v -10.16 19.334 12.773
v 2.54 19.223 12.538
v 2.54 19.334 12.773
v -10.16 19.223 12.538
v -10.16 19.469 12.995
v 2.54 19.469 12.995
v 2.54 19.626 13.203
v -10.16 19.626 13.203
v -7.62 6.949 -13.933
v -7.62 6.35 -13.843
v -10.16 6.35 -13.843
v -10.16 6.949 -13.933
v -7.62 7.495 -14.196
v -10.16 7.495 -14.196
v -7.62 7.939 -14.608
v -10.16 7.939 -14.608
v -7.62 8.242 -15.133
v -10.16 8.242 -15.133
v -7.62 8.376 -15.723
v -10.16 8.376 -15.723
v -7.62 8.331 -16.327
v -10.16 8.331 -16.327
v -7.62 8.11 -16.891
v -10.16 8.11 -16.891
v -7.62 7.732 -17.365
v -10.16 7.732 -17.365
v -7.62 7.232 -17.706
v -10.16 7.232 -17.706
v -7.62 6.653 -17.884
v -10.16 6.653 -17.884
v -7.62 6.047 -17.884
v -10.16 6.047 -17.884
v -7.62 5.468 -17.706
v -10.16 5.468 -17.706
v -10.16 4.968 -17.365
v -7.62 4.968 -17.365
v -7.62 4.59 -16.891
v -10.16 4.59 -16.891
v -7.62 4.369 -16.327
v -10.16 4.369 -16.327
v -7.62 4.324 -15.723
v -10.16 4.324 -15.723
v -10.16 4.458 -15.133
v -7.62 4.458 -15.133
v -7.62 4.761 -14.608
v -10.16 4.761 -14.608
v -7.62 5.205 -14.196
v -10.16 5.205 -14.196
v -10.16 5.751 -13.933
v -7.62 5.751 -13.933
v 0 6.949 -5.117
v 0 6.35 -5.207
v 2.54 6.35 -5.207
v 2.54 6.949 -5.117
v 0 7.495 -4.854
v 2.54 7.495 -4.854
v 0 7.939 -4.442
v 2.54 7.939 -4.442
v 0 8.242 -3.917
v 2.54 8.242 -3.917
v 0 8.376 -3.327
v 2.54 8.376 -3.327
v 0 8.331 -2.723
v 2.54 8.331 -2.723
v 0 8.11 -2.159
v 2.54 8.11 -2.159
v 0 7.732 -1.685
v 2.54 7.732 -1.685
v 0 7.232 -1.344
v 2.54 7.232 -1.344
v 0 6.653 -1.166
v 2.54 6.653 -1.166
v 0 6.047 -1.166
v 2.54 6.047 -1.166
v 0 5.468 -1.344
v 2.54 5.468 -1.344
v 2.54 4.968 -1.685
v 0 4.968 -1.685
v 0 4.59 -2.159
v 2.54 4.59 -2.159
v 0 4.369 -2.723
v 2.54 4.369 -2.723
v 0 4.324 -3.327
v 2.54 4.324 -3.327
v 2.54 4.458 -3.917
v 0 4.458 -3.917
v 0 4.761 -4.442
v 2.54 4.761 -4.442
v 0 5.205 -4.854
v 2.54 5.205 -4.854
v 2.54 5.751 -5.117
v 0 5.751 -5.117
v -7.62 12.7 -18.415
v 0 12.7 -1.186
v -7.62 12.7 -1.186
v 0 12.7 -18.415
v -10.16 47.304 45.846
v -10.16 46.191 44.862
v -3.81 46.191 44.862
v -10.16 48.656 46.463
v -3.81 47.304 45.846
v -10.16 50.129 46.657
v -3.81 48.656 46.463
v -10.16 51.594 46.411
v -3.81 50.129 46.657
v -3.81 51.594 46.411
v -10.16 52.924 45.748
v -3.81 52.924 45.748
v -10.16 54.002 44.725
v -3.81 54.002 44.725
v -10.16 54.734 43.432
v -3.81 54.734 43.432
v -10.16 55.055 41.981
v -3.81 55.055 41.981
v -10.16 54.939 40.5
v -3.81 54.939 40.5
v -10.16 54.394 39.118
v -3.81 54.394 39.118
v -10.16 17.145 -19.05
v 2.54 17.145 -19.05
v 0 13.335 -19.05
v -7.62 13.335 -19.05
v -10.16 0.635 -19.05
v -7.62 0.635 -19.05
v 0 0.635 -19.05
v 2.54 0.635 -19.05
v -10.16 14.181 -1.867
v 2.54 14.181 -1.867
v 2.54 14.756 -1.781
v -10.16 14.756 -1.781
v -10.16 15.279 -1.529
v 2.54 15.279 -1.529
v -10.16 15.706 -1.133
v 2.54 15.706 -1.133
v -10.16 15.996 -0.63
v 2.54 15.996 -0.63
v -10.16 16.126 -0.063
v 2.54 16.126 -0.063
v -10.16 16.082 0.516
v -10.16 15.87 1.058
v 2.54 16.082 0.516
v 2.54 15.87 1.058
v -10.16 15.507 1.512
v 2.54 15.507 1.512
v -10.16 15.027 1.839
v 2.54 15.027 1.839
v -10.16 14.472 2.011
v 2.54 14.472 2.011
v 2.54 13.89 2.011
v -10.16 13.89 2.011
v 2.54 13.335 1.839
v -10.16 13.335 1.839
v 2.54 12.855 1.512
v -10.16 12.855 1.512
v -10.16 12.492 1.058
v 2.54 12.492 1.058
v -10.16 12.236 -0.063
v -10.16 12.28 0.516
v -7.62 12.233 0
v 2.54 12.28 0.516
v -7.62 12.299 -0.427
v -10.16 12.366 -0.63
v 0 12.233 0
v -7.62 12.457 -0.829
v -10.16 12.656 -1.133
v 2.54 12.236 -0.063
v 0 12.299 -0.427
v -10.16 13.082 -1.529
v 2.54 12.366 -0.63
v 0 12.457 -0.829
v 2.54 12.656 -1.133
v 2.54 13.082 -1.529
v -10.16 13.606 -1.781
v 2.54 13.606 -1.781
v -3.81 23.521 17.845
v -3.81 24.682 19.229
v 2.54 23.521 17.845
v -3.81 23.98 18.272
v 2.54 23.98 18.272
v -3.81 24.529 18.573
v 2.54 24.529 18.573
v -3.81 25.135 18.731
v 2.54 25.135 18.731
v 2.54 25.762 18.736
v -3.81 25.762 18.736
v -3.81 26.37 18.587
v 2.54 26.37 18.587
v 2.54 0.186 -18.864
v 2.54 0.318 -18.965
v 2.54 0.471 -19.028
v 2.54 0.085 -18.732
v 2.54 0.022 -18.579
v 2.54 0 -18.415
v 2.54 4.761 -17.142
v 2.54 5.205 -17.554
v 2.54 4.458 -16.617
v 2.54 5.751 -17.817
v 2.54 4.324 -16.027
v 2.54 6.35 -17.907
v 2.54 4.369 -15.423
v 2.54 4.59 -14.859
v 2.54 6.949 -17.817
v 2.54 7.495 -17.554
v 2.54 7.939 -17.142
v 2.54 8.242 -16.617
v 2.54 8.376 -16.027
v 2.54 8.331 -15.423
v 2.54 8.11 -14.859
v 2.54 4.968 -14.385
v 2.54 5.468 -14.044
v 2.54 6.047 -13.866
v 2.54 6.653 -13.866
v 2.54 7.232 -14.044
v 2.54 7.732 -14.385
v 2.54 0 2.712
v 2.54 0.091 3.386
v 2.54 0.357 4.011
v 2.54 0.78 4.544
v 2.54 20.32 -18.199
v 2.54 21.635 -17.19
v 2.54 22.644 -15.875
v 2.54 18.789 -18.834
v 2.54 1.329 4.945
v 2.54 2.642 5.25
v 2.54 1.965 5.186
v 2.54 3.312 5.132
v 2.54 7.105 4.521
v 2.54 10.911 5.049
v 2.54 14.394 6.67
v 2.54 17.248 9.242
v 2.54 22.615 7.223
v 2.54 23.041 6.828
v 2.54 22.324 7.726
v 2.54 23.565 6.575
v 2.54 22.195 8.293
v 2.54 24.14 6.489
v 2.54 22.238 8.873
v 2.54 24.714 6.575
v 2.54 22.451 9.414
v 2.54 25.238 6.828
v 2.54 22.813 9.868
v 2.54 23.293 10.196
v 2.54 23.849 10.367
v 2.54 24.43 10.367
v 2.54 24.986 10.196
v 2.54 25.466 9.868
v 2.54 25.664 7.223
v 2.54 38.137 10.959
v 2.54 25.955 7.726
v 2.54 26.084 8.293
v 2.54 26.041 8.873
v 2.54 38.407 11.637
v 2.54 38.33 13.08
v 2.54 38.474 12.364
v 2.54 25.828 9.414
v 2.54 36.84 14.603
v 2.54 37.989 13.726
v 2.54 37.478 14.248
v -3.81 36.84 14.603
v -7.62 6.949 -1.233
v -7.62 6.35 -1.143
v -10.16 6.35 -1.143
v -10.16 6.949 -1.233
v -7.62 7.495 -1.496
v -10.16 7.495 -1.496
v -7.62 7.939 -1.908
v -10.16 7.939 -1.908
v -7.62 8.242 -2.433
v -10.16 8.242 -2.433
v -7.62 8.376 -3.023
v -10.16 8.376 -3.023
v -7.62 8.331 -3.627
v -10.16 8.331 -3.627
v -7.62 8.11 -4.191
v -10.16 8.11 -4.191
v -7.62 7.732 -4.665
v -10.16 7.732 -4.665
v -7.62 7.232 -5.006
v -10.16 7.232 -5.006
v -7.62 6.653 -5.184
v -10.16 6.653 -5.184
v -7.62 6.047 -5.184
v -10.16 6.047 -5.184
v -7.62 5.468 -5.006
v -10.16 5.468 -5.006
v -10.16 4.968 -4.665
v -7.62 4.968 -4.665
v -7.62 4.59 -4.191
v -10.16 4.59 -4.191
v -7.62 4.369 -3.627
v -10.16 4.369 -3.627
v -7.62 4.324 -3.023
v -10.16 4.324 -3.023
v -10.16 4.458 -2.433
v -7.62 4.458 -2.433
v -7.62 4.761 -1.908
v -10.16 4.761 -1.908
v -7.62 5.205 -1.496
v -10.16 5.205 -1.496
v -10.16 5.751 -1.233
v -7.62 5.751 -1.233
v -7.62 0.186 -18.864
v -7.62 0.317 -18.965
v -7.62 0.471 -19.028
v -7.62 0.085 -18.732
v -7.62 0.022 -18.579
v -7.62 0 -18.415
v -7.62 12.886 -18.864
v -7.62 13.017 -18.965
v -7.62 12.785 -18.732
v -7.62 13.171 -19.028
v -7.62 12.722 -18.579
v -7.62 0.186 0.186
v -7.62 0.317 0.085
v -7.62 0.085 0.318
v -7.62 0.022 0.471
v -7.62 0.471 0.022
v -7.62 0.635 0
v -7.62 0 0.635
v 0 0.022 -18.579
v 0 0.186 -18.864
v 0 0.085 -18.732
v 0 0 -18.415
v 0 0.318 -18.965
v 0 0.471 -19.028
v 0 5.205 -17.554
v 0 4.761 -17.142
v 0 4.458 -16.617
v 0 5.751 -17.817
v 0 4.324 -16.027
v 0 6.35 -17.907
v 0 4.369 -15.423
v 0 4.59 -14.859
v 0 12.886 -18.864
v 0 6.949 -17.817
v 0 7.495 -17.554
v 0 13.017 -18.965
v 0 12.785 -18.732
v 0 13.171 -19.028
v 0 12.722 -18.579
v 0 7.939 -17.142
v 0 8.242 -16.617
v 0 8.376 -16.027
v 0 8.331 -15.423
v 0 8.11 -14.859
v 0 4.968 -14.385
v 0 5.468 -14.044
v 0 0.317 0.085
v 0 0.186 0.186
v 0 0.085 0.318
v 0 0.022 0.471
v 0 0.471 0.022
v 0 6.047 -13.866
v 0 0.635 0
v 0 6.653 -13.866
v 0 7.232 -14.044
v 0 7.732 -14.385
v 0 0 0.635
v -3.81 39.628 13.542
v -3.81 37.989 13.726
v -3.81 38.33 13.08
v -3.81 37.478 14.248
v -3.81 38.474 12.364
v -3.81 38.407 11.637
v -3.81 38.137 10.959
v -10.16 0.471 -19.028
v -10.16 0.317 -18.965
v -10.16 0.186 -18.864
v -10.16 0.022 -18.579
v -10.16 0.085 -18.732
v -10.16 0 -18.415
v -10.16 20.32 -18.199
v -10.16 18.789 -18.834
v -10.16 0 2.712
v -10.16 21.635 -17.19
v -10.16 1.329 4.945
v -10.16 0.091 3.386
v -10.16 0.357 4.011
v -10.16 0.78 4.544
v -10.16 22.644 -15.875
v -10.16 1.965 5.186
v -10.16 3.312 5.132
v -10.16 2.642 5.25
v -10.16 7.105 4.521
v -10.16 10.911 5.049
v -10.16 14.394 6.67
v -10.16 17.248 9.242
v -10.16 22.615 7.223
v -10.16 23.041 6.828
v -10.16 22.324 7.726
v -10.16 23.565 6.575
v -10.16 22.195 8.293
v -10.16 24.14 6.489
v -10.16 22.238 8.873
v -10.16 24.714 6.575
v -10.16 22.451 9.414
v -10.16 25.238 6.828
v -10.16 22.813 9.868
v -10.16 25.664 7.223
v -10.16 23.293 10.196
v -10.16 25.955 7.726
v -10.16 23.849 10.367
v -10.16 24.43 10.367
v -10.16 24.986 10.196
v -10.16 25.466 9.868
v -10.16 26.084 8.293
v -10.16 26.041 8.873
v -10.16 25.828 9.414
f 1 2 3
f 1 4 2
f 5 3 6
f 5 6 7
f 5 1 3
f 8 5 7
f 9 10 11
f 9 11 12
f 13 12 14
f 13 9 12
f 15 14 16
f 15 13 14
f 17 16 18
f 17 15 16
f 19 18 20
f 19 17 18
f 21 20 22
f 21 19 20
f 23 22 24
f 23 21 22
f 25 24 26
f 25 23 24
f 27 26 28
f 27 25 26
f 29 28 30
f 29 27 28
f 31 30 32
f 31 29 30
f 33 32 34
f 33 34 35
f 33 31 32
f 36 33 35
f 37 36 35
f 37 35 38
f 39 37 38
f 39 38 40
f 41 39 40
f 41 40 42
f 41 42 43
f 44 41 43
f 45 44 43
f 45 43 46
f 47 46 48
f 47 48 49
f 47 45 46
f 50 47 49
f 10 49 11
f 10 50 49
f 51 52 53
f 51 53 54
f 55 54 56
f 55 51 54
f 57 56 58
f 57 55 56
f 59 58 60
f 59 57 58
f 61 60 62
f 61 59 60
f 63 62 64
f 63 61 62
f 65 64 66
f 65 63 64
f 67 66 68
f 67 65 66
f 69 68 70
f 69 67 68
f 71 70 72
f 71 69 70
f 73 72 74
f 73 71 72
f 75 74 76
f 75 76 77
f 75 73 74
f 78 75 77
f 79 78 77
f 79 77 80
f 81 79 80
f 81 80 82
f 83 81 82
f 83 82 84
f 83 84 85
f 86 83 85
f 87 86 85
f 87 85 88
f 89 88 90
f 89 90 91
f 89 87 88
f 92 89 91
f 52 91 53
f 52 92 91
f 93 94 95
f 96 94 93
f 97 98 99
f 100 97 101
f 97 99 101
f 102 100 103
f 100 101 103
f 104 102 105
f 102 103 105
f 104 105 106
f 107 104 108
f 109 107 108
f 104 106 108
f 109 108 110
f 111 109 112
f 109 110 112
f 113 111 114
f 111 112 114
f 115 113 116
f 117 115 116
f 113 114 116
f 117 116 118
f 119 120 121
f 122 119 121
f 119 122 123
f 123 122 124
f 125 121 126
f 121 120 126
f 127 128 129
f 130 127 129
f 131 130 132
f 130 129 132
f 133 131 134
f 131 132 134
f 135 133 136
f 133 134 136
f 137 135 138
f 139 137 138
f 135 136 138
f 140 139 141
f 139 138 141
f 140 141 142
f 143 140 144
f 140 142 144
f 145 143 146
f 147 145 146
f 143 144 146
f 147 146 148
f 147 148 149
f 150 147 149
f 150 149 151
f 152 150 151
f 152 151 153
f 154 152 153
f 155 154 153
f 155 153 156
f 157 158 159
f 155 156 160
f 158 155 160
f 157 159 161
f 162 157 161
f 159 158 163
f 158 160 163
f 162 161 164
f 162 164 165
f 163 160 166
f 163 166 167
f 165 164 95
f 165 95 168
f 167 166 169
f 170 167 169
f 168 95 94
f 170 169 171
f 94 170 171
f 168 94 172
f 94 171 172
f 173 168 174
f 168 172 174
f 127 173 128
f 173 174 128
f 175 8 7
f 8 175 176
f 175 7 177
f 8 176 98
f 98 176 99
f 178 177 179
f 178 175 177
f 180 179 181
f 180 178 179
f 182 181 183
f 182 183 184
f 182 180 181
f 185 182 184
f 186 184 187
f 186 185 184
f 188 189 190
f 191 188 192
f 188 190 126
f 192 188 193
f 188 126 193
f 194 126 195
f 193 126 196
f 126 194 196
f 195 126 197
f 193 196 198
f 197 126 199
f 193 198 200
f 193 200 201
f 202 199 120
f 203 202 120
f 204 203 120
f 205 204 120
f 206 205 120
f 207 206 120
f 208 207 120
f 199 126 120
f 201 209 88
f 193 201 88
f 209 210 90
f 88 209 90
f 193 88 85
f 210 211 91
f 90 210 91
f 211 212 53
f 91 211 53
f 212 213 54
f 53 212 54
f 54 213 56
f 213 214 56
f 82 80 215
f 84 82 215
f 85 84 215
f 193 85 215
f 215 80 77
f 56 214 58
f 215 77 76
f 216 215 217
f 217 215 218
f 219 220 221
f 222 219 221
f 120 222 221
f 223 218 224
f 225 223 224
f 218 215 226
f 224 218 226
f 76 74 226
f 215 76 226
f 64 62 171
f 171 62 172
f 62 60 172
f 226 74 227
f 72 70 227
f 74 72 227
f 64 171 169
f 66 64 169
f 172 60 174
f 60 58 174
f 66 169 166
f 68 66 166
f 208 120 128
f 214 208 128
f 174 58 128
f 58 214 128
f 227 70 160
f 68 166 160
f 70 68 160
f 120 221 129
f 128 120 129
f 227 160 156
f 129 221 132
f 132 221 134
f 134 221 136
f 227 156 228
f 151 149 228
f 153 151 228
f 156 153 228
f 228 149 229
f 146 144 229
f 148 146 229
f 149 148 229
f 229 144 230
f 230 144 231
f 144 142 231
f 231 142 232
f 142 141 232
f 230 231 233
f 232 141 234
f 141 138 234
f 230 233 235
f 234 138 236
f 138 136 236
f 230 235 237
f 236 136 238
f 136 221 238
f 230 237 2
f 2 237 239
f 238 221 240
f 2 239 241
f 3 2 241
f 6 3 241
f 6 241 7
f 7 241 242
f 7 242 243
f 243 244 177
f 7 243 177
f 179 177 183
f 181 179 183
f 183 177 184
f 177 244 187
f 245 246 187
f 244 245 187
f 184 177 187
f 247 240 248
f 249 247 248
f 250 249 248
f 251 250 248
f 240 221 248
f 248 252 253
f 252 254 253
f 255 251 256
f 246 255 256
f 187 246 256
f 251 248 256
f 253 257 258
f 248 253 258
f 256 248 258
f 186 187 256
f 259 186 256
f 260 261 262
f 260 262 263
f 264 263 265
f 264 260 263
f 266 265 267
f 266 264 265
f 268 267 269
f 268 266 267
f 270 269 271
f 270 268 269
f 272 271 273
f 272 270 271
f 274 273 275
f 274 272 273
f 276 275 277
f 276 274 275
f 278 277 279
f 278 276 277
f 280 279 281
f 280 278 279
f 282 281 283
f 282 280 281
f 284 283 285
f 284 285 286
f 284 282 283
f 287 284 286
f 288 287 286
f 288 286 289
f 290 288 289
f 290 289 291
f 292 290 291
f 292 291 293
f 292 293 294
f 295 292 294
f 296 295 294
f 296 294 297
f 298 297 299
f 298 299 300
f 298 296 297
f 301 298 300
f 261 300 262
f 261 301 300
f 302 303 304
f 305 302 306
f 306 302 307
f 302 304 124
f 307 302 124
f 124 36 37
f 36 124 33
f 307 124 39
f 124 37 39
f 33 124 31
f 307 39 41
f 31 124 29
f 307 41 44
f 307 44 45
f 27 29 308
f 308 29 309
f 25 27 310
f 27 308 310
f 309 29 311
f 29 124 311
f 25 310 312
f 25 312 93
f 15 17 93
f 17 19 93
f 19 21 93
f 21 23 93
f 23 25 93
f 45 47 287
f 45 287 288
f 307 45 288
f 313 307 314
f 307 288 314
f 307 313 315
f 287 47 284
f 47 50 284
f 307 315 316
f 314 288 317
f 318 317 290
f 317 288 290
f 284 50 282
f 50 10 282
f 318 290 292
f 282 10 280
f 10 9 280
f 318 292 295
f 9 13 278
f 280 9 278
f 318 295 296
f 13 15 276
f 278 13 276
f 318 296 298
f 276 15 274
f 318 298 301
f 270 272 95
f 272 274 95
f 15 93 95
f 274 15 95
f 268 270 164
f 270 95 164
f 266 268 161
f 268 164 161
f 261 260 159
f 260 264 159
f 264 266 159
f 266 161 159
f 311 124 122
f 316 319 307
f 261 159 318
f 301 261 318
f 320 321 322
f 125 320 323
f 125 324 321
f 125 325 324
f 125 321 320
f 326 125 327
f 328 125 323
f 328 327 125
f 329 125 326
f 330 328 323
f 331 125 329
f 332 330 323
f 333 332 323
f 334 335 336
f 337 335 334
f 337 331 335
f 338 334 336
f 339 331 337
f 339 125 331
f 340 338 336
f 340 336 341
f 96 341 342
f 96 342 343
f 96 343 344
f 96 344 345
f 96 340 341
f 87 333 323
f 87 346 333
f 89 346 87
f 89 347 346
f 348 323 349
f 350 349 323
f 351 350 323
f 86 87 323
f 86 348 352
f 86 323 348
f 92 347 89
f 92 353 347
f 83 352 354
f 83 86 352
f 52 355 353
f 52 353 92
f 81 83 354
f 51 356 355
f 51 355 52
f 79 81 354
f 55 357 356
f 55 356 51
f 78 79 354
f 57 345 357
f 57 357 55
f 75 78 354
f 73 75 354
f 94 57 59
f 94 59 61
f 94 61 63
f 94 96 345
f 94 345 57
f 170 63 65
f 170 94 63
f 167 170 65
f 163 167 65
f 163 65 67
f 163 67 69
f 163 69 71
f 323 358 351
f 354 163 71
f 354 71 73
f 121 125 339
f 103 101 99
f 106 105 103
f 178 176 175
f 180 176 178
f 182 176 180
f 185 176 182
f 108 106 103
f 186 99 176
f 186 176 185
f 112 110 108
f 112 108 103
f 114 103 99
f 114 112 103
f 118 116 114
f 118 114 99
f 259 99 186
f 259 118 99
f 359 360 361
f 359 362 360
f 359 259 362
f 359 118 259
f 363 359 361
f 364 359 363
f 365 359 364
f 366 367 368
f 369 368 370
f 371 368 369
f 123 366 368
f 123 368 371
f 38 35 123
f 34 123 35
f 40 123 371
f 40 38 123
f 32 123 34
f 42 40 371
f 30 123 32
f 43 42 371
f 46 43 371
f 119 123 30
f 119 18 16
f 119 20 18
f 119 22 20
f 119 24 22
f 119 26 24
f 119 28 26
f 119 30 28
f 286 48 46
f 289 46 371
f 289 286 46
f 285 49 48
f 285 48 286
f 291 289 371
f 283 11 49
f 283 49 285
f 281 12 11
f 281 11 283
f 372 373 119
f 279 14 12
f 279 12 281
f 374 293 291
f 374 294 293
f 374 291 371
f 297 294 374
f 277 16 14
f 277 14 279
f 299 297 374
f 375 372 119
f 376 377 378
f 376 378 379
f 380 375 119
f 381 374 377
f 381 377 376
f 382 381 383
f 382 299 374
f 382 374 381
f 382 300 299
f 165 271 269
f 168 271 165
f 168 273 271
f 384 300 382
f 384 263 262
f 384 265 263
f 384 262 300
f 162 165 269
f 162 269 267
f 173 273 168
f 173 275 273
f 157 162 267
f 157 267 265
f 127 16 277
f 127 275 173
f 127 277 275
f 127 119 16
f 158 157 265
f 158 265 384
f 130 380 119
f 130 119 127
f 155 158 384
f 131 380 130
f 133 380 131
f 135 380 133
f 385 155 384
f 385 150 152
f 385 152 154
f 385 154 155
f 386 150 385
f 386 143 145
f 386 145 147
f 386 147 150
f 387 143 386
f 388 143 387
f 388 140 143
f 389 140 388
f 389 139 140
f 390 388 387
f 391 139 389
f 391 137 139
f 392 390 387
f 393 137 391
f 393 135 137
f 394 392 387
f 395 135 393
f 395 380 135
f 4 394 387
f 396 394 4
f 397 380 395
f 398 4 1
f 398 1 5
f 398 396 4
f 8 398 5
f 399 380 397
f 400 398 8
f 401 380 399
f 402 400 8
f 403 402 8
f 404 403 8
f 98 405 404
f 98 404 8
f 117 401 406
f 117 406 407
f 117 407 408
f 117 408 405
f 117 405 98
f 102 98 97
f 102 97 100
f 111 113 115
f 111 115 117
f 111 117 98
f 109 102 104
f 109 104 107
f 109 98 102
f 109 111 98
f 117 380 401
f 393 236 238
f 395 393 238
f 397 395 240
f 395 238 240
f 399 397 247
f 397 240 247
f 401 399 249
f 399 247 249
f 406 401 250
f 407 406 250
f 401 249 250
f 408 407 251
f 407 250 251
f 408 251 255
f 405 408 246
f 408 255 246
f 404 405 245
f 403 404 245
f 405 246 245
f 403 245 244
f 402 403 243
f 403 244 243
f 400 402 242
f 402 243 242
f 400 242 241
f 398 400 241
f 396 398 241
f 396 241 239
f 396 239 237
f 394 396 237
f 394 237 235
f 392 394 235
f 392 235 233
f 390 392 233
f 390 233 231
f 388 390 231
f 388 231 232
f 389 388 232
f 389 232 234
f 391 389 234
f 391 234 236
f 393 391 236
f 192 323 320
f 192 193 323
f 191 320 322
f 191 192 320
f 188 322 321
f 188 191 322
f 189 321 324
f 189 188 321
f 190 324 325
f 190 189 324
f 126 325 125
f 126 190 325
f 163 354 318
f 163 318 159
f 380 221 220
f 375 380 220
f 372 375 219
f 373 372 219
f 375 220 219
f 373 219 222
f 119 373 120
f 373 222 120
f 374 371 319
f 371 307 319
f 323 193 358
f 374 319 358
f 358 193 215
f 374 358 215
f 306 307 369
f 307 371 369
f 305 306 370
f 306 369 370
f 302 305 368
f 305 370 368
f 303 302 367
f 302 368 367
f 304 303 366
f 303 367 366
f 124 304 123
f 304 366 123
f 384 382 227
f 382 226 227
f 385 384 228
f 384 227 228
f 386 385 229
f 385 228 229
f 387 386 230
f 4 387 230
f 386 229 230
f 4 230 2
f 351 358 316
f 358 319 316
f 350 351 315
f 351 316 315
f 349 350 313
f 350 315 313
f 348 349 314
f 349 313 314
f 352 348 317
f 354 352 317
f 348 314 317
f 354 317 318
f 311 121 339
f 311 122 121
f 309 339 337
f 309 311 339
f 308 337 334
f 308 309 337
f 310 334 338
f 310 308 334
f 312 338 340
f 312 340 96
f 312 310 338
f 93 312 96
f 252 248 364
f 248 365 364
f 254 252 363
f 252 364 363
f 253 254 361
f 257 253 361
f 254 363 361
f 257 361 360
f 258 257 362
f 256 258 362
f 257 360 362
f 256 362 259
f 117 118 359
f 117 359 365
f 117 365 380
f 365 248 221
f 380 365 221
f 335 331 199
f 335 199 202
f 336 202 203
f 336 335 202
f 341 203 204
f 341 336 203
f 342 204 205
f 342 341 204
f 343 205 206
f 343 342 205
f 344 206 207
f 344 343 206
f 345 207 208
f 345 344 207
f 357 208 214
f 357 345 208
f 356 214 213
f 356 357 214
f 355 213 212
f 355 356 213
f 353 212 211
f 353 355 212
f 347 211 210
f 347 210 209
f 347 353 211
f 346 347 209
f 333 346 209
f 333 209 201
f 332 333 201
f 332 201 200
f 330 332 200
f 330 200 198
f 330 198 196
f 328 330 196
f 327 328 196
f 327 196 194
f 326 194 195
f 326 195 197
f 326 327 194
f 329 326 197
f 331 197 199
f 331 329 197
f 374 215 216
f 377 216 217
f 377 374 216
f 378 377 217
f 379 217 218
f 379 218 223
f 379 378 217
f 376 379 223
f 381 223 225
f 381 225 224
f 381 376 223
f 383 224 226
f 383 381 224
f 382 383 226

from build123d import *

# Parameters (mm, degrees)
SKETCH1_R           = 2.032
BOSS_EXTRUDE1_DEPTH = 2.54
BOSS_EXTRUDE2_START = -7.62
BOSS_EXTRUDE2_DEPTH = 7.62
BOSS_EXTRUDE3_START = 2.54
SKETCH4_R           = 2.032
BOSS_EXTRUDE3_DEPTH = 2.54
CUT_EXTRUDE2_START  = -6.35
CUT_EXTRUDE2_DEPTH  = 6.35
FILLET1_R           = 2.54
FILLET2_R           = 0.635
SKETCH6_R           = 1.95
CUT_EXTRUDE3_DEPTH  = 74.28469602


with BuildPart() as part:
    # Sketch1 → Boss-Extrude1 (new body)
    with BuildSketch(Plane(origin=(0, 0, 0), x_dir=(0, 0, -1), z_dir=(1, 0, 0))):
        with BuildLine():
            Line((19.05, 0), (19.05, 17.145))
            ThreePointArc((19.05, 17.145), (18.199261314, 20.32), (15.875, 22.644261314))
            Line((15.875, 22.644261314), (-39.11761314, 54.394261314))
            ThreePointArc((-39.11761314, 54.394261314), (-45.74830741, 52.924271785), (-44.861814719, 46.190691279))
            Line((-44.861814719, 46.190691279), (-12.887784973, 19.361294713))
            ThreePointArc((-12.887784973, 19.361294713), (-5.127948142, 11.168903642), (-6.736031019, 0))
            Line((-6.736031019, 0), (19.05, 0))
        make_face()
        with Locations((3.175, 6.35)):
            Circle(SKETCH1_R, mode=Mode.SUBTRACT)
        with Locations((15.875, 6.35)):
            Circle(SKETCH1_R, mode=Mode.SUBTRACT)
    extrude(amount=BOSS_EXTRUDE1_DEPTH)

    # Sketch1<4> → Boss-Extrude2 (add)
    with BuildSketch(Plane(origin=(0, 0, 0), x_dir=(0, 0, -1), z_dir=(1, 0, 0)).offset(BOSS_EXTRUDE2_START)):
        with BuildLine():
            Line((-6.736031019, 0), (0, 0))
            Line((0, 0), (0, 12.7))
            Line((0, 12.7), (19.05, 12.7))
            Line((19.05, 12.7), (19.05, 17.145))
            ThreePointArc((19.05, 17.145), (18.199261314, 20.32), (15.875, 22.644261314))
            Line((15.875, 22.644261314), (-39.11761314, 54.394261314))
            ThreePointArc((-39.11761314, 54.394261314), (-45.74830741, 52.924271785), (-44.861814719, 46.190691279))
            Line((-44.861814719, 46.190691279), (-12.887784973, 19.361294713))
            ThreePointArc((-12.887784973, 19.361294713), (-5.127948142, 11.168903642), (-6.736031019, 0))
        make_face()
    extrude(amount=BOSS_EXTRUDE2_DEPTH)

    # Sketch4 → Boss-Extrude3 (add)
    with BuildSketch(Plane.ZY.offset(7.62).offset(BOSS_EXTRUDE3_START)):
        with BuildLine():
            Line((-19.05, 0), (6.736031019, 0))
            ThreePointArc((6.736031019, 0), (5.127948142, 11.168903642), (12.887784973, 19.361294713))
            Line((12.887784973, 19.361294713), (44.861814719, 46.190691279))
            ThreePointArc((44.861814719, 46.190691279), (45.74830741, 52.924271785), (39.11761314, 54.394261314))
            Line((39.11761314, 54.394261314), (-15.875, 22.644261314))
            ThreePointArc((-15.875, 22.644261314), (-18.199261314, 20.32), (-19.05, 17.145))
            Line((-19.05, 17.145), (-19.05, 0))
        make_face()
        with Locations((-3.175, 6.35)):
            Circle(SKETCH4_R, mode=Mode.SUBTRACT)
        with Locations((-15.875, 6.35)):
            Circle(SKETCH4_R, mode=Mode.SUBTRACT)
    extrude(amount=-BOSS_EXTRUDE3_DEPTH)

    # Sketch5 → Cut-Extrude2 (cut)
    with BuildSketch(Plane(origin=(2.54, 0, 0), x_dir=(0, 0, -1), z_dir=(1, 0, 0)).offset(CUT_EXTRUDE2_START)):
        with BuildLine():
            Line((-19.229074876, 24.682268731), (-13.542236075, 39.628310481))
            Line((-13.542236075, 39.628310481), (-39.11761314, 54.394261314))
            ThreePointArc((-39.11761314, 54.394261314), (-45.74830741, 52.924271785), (-44.861814719, 46.190691279))
            Line((-44.861814719, 46.190691279), (-19.229074876, 24.682268731))
        make_face()
    extrude(amount=CUT_EXTRUDE2_DEPTH, mode=Mode.SUBTRACT)

    # Fillet1
    fillet1_edges = [part.edges().sort_by_distance(p)[0] for p in [
        (-3.81, 0, 6.736031019),
        (-0.635, 39.628310481, 13.542236075),
        (-3.81, 19.361294713, 12.887784973),
        (-0.635, 24.682268731, 19.229074876),
    ]]
    fillet(fillet1_edges, radius=FILLET1_R)

    # Fillet2
    fillet2_edges = [part.edges().sort_by_distance(p)[0] for p in [
        (-3.81, 0, 0),
        (-8.89, 0, -19.05),
        (1.27, 0, -19.05),
        (-3.81, 12.7, -19.05),
    ]]
    fillet(fillet2_edges, radius=FILLET2_R)

    # Sketch6 → Cut-Extrude3 (cut, through all)
    with BuildSketch(Plane(origin=(2.54, 0, 0), x_dir=(0, 0, -1), z_dir=(1, 0, 0))):
        with Locations((-0.082541576, 14.180960145)):
            Circle(SKETCH6_R)
        with Locations((-8.438780502, 24.139537906)):
            Circle(SKETCH6_R)
    extrude(amount=-CUT_EXTRUDE3_DEPTH, mode=Mode.SUBTRACT)


solid = part.part
